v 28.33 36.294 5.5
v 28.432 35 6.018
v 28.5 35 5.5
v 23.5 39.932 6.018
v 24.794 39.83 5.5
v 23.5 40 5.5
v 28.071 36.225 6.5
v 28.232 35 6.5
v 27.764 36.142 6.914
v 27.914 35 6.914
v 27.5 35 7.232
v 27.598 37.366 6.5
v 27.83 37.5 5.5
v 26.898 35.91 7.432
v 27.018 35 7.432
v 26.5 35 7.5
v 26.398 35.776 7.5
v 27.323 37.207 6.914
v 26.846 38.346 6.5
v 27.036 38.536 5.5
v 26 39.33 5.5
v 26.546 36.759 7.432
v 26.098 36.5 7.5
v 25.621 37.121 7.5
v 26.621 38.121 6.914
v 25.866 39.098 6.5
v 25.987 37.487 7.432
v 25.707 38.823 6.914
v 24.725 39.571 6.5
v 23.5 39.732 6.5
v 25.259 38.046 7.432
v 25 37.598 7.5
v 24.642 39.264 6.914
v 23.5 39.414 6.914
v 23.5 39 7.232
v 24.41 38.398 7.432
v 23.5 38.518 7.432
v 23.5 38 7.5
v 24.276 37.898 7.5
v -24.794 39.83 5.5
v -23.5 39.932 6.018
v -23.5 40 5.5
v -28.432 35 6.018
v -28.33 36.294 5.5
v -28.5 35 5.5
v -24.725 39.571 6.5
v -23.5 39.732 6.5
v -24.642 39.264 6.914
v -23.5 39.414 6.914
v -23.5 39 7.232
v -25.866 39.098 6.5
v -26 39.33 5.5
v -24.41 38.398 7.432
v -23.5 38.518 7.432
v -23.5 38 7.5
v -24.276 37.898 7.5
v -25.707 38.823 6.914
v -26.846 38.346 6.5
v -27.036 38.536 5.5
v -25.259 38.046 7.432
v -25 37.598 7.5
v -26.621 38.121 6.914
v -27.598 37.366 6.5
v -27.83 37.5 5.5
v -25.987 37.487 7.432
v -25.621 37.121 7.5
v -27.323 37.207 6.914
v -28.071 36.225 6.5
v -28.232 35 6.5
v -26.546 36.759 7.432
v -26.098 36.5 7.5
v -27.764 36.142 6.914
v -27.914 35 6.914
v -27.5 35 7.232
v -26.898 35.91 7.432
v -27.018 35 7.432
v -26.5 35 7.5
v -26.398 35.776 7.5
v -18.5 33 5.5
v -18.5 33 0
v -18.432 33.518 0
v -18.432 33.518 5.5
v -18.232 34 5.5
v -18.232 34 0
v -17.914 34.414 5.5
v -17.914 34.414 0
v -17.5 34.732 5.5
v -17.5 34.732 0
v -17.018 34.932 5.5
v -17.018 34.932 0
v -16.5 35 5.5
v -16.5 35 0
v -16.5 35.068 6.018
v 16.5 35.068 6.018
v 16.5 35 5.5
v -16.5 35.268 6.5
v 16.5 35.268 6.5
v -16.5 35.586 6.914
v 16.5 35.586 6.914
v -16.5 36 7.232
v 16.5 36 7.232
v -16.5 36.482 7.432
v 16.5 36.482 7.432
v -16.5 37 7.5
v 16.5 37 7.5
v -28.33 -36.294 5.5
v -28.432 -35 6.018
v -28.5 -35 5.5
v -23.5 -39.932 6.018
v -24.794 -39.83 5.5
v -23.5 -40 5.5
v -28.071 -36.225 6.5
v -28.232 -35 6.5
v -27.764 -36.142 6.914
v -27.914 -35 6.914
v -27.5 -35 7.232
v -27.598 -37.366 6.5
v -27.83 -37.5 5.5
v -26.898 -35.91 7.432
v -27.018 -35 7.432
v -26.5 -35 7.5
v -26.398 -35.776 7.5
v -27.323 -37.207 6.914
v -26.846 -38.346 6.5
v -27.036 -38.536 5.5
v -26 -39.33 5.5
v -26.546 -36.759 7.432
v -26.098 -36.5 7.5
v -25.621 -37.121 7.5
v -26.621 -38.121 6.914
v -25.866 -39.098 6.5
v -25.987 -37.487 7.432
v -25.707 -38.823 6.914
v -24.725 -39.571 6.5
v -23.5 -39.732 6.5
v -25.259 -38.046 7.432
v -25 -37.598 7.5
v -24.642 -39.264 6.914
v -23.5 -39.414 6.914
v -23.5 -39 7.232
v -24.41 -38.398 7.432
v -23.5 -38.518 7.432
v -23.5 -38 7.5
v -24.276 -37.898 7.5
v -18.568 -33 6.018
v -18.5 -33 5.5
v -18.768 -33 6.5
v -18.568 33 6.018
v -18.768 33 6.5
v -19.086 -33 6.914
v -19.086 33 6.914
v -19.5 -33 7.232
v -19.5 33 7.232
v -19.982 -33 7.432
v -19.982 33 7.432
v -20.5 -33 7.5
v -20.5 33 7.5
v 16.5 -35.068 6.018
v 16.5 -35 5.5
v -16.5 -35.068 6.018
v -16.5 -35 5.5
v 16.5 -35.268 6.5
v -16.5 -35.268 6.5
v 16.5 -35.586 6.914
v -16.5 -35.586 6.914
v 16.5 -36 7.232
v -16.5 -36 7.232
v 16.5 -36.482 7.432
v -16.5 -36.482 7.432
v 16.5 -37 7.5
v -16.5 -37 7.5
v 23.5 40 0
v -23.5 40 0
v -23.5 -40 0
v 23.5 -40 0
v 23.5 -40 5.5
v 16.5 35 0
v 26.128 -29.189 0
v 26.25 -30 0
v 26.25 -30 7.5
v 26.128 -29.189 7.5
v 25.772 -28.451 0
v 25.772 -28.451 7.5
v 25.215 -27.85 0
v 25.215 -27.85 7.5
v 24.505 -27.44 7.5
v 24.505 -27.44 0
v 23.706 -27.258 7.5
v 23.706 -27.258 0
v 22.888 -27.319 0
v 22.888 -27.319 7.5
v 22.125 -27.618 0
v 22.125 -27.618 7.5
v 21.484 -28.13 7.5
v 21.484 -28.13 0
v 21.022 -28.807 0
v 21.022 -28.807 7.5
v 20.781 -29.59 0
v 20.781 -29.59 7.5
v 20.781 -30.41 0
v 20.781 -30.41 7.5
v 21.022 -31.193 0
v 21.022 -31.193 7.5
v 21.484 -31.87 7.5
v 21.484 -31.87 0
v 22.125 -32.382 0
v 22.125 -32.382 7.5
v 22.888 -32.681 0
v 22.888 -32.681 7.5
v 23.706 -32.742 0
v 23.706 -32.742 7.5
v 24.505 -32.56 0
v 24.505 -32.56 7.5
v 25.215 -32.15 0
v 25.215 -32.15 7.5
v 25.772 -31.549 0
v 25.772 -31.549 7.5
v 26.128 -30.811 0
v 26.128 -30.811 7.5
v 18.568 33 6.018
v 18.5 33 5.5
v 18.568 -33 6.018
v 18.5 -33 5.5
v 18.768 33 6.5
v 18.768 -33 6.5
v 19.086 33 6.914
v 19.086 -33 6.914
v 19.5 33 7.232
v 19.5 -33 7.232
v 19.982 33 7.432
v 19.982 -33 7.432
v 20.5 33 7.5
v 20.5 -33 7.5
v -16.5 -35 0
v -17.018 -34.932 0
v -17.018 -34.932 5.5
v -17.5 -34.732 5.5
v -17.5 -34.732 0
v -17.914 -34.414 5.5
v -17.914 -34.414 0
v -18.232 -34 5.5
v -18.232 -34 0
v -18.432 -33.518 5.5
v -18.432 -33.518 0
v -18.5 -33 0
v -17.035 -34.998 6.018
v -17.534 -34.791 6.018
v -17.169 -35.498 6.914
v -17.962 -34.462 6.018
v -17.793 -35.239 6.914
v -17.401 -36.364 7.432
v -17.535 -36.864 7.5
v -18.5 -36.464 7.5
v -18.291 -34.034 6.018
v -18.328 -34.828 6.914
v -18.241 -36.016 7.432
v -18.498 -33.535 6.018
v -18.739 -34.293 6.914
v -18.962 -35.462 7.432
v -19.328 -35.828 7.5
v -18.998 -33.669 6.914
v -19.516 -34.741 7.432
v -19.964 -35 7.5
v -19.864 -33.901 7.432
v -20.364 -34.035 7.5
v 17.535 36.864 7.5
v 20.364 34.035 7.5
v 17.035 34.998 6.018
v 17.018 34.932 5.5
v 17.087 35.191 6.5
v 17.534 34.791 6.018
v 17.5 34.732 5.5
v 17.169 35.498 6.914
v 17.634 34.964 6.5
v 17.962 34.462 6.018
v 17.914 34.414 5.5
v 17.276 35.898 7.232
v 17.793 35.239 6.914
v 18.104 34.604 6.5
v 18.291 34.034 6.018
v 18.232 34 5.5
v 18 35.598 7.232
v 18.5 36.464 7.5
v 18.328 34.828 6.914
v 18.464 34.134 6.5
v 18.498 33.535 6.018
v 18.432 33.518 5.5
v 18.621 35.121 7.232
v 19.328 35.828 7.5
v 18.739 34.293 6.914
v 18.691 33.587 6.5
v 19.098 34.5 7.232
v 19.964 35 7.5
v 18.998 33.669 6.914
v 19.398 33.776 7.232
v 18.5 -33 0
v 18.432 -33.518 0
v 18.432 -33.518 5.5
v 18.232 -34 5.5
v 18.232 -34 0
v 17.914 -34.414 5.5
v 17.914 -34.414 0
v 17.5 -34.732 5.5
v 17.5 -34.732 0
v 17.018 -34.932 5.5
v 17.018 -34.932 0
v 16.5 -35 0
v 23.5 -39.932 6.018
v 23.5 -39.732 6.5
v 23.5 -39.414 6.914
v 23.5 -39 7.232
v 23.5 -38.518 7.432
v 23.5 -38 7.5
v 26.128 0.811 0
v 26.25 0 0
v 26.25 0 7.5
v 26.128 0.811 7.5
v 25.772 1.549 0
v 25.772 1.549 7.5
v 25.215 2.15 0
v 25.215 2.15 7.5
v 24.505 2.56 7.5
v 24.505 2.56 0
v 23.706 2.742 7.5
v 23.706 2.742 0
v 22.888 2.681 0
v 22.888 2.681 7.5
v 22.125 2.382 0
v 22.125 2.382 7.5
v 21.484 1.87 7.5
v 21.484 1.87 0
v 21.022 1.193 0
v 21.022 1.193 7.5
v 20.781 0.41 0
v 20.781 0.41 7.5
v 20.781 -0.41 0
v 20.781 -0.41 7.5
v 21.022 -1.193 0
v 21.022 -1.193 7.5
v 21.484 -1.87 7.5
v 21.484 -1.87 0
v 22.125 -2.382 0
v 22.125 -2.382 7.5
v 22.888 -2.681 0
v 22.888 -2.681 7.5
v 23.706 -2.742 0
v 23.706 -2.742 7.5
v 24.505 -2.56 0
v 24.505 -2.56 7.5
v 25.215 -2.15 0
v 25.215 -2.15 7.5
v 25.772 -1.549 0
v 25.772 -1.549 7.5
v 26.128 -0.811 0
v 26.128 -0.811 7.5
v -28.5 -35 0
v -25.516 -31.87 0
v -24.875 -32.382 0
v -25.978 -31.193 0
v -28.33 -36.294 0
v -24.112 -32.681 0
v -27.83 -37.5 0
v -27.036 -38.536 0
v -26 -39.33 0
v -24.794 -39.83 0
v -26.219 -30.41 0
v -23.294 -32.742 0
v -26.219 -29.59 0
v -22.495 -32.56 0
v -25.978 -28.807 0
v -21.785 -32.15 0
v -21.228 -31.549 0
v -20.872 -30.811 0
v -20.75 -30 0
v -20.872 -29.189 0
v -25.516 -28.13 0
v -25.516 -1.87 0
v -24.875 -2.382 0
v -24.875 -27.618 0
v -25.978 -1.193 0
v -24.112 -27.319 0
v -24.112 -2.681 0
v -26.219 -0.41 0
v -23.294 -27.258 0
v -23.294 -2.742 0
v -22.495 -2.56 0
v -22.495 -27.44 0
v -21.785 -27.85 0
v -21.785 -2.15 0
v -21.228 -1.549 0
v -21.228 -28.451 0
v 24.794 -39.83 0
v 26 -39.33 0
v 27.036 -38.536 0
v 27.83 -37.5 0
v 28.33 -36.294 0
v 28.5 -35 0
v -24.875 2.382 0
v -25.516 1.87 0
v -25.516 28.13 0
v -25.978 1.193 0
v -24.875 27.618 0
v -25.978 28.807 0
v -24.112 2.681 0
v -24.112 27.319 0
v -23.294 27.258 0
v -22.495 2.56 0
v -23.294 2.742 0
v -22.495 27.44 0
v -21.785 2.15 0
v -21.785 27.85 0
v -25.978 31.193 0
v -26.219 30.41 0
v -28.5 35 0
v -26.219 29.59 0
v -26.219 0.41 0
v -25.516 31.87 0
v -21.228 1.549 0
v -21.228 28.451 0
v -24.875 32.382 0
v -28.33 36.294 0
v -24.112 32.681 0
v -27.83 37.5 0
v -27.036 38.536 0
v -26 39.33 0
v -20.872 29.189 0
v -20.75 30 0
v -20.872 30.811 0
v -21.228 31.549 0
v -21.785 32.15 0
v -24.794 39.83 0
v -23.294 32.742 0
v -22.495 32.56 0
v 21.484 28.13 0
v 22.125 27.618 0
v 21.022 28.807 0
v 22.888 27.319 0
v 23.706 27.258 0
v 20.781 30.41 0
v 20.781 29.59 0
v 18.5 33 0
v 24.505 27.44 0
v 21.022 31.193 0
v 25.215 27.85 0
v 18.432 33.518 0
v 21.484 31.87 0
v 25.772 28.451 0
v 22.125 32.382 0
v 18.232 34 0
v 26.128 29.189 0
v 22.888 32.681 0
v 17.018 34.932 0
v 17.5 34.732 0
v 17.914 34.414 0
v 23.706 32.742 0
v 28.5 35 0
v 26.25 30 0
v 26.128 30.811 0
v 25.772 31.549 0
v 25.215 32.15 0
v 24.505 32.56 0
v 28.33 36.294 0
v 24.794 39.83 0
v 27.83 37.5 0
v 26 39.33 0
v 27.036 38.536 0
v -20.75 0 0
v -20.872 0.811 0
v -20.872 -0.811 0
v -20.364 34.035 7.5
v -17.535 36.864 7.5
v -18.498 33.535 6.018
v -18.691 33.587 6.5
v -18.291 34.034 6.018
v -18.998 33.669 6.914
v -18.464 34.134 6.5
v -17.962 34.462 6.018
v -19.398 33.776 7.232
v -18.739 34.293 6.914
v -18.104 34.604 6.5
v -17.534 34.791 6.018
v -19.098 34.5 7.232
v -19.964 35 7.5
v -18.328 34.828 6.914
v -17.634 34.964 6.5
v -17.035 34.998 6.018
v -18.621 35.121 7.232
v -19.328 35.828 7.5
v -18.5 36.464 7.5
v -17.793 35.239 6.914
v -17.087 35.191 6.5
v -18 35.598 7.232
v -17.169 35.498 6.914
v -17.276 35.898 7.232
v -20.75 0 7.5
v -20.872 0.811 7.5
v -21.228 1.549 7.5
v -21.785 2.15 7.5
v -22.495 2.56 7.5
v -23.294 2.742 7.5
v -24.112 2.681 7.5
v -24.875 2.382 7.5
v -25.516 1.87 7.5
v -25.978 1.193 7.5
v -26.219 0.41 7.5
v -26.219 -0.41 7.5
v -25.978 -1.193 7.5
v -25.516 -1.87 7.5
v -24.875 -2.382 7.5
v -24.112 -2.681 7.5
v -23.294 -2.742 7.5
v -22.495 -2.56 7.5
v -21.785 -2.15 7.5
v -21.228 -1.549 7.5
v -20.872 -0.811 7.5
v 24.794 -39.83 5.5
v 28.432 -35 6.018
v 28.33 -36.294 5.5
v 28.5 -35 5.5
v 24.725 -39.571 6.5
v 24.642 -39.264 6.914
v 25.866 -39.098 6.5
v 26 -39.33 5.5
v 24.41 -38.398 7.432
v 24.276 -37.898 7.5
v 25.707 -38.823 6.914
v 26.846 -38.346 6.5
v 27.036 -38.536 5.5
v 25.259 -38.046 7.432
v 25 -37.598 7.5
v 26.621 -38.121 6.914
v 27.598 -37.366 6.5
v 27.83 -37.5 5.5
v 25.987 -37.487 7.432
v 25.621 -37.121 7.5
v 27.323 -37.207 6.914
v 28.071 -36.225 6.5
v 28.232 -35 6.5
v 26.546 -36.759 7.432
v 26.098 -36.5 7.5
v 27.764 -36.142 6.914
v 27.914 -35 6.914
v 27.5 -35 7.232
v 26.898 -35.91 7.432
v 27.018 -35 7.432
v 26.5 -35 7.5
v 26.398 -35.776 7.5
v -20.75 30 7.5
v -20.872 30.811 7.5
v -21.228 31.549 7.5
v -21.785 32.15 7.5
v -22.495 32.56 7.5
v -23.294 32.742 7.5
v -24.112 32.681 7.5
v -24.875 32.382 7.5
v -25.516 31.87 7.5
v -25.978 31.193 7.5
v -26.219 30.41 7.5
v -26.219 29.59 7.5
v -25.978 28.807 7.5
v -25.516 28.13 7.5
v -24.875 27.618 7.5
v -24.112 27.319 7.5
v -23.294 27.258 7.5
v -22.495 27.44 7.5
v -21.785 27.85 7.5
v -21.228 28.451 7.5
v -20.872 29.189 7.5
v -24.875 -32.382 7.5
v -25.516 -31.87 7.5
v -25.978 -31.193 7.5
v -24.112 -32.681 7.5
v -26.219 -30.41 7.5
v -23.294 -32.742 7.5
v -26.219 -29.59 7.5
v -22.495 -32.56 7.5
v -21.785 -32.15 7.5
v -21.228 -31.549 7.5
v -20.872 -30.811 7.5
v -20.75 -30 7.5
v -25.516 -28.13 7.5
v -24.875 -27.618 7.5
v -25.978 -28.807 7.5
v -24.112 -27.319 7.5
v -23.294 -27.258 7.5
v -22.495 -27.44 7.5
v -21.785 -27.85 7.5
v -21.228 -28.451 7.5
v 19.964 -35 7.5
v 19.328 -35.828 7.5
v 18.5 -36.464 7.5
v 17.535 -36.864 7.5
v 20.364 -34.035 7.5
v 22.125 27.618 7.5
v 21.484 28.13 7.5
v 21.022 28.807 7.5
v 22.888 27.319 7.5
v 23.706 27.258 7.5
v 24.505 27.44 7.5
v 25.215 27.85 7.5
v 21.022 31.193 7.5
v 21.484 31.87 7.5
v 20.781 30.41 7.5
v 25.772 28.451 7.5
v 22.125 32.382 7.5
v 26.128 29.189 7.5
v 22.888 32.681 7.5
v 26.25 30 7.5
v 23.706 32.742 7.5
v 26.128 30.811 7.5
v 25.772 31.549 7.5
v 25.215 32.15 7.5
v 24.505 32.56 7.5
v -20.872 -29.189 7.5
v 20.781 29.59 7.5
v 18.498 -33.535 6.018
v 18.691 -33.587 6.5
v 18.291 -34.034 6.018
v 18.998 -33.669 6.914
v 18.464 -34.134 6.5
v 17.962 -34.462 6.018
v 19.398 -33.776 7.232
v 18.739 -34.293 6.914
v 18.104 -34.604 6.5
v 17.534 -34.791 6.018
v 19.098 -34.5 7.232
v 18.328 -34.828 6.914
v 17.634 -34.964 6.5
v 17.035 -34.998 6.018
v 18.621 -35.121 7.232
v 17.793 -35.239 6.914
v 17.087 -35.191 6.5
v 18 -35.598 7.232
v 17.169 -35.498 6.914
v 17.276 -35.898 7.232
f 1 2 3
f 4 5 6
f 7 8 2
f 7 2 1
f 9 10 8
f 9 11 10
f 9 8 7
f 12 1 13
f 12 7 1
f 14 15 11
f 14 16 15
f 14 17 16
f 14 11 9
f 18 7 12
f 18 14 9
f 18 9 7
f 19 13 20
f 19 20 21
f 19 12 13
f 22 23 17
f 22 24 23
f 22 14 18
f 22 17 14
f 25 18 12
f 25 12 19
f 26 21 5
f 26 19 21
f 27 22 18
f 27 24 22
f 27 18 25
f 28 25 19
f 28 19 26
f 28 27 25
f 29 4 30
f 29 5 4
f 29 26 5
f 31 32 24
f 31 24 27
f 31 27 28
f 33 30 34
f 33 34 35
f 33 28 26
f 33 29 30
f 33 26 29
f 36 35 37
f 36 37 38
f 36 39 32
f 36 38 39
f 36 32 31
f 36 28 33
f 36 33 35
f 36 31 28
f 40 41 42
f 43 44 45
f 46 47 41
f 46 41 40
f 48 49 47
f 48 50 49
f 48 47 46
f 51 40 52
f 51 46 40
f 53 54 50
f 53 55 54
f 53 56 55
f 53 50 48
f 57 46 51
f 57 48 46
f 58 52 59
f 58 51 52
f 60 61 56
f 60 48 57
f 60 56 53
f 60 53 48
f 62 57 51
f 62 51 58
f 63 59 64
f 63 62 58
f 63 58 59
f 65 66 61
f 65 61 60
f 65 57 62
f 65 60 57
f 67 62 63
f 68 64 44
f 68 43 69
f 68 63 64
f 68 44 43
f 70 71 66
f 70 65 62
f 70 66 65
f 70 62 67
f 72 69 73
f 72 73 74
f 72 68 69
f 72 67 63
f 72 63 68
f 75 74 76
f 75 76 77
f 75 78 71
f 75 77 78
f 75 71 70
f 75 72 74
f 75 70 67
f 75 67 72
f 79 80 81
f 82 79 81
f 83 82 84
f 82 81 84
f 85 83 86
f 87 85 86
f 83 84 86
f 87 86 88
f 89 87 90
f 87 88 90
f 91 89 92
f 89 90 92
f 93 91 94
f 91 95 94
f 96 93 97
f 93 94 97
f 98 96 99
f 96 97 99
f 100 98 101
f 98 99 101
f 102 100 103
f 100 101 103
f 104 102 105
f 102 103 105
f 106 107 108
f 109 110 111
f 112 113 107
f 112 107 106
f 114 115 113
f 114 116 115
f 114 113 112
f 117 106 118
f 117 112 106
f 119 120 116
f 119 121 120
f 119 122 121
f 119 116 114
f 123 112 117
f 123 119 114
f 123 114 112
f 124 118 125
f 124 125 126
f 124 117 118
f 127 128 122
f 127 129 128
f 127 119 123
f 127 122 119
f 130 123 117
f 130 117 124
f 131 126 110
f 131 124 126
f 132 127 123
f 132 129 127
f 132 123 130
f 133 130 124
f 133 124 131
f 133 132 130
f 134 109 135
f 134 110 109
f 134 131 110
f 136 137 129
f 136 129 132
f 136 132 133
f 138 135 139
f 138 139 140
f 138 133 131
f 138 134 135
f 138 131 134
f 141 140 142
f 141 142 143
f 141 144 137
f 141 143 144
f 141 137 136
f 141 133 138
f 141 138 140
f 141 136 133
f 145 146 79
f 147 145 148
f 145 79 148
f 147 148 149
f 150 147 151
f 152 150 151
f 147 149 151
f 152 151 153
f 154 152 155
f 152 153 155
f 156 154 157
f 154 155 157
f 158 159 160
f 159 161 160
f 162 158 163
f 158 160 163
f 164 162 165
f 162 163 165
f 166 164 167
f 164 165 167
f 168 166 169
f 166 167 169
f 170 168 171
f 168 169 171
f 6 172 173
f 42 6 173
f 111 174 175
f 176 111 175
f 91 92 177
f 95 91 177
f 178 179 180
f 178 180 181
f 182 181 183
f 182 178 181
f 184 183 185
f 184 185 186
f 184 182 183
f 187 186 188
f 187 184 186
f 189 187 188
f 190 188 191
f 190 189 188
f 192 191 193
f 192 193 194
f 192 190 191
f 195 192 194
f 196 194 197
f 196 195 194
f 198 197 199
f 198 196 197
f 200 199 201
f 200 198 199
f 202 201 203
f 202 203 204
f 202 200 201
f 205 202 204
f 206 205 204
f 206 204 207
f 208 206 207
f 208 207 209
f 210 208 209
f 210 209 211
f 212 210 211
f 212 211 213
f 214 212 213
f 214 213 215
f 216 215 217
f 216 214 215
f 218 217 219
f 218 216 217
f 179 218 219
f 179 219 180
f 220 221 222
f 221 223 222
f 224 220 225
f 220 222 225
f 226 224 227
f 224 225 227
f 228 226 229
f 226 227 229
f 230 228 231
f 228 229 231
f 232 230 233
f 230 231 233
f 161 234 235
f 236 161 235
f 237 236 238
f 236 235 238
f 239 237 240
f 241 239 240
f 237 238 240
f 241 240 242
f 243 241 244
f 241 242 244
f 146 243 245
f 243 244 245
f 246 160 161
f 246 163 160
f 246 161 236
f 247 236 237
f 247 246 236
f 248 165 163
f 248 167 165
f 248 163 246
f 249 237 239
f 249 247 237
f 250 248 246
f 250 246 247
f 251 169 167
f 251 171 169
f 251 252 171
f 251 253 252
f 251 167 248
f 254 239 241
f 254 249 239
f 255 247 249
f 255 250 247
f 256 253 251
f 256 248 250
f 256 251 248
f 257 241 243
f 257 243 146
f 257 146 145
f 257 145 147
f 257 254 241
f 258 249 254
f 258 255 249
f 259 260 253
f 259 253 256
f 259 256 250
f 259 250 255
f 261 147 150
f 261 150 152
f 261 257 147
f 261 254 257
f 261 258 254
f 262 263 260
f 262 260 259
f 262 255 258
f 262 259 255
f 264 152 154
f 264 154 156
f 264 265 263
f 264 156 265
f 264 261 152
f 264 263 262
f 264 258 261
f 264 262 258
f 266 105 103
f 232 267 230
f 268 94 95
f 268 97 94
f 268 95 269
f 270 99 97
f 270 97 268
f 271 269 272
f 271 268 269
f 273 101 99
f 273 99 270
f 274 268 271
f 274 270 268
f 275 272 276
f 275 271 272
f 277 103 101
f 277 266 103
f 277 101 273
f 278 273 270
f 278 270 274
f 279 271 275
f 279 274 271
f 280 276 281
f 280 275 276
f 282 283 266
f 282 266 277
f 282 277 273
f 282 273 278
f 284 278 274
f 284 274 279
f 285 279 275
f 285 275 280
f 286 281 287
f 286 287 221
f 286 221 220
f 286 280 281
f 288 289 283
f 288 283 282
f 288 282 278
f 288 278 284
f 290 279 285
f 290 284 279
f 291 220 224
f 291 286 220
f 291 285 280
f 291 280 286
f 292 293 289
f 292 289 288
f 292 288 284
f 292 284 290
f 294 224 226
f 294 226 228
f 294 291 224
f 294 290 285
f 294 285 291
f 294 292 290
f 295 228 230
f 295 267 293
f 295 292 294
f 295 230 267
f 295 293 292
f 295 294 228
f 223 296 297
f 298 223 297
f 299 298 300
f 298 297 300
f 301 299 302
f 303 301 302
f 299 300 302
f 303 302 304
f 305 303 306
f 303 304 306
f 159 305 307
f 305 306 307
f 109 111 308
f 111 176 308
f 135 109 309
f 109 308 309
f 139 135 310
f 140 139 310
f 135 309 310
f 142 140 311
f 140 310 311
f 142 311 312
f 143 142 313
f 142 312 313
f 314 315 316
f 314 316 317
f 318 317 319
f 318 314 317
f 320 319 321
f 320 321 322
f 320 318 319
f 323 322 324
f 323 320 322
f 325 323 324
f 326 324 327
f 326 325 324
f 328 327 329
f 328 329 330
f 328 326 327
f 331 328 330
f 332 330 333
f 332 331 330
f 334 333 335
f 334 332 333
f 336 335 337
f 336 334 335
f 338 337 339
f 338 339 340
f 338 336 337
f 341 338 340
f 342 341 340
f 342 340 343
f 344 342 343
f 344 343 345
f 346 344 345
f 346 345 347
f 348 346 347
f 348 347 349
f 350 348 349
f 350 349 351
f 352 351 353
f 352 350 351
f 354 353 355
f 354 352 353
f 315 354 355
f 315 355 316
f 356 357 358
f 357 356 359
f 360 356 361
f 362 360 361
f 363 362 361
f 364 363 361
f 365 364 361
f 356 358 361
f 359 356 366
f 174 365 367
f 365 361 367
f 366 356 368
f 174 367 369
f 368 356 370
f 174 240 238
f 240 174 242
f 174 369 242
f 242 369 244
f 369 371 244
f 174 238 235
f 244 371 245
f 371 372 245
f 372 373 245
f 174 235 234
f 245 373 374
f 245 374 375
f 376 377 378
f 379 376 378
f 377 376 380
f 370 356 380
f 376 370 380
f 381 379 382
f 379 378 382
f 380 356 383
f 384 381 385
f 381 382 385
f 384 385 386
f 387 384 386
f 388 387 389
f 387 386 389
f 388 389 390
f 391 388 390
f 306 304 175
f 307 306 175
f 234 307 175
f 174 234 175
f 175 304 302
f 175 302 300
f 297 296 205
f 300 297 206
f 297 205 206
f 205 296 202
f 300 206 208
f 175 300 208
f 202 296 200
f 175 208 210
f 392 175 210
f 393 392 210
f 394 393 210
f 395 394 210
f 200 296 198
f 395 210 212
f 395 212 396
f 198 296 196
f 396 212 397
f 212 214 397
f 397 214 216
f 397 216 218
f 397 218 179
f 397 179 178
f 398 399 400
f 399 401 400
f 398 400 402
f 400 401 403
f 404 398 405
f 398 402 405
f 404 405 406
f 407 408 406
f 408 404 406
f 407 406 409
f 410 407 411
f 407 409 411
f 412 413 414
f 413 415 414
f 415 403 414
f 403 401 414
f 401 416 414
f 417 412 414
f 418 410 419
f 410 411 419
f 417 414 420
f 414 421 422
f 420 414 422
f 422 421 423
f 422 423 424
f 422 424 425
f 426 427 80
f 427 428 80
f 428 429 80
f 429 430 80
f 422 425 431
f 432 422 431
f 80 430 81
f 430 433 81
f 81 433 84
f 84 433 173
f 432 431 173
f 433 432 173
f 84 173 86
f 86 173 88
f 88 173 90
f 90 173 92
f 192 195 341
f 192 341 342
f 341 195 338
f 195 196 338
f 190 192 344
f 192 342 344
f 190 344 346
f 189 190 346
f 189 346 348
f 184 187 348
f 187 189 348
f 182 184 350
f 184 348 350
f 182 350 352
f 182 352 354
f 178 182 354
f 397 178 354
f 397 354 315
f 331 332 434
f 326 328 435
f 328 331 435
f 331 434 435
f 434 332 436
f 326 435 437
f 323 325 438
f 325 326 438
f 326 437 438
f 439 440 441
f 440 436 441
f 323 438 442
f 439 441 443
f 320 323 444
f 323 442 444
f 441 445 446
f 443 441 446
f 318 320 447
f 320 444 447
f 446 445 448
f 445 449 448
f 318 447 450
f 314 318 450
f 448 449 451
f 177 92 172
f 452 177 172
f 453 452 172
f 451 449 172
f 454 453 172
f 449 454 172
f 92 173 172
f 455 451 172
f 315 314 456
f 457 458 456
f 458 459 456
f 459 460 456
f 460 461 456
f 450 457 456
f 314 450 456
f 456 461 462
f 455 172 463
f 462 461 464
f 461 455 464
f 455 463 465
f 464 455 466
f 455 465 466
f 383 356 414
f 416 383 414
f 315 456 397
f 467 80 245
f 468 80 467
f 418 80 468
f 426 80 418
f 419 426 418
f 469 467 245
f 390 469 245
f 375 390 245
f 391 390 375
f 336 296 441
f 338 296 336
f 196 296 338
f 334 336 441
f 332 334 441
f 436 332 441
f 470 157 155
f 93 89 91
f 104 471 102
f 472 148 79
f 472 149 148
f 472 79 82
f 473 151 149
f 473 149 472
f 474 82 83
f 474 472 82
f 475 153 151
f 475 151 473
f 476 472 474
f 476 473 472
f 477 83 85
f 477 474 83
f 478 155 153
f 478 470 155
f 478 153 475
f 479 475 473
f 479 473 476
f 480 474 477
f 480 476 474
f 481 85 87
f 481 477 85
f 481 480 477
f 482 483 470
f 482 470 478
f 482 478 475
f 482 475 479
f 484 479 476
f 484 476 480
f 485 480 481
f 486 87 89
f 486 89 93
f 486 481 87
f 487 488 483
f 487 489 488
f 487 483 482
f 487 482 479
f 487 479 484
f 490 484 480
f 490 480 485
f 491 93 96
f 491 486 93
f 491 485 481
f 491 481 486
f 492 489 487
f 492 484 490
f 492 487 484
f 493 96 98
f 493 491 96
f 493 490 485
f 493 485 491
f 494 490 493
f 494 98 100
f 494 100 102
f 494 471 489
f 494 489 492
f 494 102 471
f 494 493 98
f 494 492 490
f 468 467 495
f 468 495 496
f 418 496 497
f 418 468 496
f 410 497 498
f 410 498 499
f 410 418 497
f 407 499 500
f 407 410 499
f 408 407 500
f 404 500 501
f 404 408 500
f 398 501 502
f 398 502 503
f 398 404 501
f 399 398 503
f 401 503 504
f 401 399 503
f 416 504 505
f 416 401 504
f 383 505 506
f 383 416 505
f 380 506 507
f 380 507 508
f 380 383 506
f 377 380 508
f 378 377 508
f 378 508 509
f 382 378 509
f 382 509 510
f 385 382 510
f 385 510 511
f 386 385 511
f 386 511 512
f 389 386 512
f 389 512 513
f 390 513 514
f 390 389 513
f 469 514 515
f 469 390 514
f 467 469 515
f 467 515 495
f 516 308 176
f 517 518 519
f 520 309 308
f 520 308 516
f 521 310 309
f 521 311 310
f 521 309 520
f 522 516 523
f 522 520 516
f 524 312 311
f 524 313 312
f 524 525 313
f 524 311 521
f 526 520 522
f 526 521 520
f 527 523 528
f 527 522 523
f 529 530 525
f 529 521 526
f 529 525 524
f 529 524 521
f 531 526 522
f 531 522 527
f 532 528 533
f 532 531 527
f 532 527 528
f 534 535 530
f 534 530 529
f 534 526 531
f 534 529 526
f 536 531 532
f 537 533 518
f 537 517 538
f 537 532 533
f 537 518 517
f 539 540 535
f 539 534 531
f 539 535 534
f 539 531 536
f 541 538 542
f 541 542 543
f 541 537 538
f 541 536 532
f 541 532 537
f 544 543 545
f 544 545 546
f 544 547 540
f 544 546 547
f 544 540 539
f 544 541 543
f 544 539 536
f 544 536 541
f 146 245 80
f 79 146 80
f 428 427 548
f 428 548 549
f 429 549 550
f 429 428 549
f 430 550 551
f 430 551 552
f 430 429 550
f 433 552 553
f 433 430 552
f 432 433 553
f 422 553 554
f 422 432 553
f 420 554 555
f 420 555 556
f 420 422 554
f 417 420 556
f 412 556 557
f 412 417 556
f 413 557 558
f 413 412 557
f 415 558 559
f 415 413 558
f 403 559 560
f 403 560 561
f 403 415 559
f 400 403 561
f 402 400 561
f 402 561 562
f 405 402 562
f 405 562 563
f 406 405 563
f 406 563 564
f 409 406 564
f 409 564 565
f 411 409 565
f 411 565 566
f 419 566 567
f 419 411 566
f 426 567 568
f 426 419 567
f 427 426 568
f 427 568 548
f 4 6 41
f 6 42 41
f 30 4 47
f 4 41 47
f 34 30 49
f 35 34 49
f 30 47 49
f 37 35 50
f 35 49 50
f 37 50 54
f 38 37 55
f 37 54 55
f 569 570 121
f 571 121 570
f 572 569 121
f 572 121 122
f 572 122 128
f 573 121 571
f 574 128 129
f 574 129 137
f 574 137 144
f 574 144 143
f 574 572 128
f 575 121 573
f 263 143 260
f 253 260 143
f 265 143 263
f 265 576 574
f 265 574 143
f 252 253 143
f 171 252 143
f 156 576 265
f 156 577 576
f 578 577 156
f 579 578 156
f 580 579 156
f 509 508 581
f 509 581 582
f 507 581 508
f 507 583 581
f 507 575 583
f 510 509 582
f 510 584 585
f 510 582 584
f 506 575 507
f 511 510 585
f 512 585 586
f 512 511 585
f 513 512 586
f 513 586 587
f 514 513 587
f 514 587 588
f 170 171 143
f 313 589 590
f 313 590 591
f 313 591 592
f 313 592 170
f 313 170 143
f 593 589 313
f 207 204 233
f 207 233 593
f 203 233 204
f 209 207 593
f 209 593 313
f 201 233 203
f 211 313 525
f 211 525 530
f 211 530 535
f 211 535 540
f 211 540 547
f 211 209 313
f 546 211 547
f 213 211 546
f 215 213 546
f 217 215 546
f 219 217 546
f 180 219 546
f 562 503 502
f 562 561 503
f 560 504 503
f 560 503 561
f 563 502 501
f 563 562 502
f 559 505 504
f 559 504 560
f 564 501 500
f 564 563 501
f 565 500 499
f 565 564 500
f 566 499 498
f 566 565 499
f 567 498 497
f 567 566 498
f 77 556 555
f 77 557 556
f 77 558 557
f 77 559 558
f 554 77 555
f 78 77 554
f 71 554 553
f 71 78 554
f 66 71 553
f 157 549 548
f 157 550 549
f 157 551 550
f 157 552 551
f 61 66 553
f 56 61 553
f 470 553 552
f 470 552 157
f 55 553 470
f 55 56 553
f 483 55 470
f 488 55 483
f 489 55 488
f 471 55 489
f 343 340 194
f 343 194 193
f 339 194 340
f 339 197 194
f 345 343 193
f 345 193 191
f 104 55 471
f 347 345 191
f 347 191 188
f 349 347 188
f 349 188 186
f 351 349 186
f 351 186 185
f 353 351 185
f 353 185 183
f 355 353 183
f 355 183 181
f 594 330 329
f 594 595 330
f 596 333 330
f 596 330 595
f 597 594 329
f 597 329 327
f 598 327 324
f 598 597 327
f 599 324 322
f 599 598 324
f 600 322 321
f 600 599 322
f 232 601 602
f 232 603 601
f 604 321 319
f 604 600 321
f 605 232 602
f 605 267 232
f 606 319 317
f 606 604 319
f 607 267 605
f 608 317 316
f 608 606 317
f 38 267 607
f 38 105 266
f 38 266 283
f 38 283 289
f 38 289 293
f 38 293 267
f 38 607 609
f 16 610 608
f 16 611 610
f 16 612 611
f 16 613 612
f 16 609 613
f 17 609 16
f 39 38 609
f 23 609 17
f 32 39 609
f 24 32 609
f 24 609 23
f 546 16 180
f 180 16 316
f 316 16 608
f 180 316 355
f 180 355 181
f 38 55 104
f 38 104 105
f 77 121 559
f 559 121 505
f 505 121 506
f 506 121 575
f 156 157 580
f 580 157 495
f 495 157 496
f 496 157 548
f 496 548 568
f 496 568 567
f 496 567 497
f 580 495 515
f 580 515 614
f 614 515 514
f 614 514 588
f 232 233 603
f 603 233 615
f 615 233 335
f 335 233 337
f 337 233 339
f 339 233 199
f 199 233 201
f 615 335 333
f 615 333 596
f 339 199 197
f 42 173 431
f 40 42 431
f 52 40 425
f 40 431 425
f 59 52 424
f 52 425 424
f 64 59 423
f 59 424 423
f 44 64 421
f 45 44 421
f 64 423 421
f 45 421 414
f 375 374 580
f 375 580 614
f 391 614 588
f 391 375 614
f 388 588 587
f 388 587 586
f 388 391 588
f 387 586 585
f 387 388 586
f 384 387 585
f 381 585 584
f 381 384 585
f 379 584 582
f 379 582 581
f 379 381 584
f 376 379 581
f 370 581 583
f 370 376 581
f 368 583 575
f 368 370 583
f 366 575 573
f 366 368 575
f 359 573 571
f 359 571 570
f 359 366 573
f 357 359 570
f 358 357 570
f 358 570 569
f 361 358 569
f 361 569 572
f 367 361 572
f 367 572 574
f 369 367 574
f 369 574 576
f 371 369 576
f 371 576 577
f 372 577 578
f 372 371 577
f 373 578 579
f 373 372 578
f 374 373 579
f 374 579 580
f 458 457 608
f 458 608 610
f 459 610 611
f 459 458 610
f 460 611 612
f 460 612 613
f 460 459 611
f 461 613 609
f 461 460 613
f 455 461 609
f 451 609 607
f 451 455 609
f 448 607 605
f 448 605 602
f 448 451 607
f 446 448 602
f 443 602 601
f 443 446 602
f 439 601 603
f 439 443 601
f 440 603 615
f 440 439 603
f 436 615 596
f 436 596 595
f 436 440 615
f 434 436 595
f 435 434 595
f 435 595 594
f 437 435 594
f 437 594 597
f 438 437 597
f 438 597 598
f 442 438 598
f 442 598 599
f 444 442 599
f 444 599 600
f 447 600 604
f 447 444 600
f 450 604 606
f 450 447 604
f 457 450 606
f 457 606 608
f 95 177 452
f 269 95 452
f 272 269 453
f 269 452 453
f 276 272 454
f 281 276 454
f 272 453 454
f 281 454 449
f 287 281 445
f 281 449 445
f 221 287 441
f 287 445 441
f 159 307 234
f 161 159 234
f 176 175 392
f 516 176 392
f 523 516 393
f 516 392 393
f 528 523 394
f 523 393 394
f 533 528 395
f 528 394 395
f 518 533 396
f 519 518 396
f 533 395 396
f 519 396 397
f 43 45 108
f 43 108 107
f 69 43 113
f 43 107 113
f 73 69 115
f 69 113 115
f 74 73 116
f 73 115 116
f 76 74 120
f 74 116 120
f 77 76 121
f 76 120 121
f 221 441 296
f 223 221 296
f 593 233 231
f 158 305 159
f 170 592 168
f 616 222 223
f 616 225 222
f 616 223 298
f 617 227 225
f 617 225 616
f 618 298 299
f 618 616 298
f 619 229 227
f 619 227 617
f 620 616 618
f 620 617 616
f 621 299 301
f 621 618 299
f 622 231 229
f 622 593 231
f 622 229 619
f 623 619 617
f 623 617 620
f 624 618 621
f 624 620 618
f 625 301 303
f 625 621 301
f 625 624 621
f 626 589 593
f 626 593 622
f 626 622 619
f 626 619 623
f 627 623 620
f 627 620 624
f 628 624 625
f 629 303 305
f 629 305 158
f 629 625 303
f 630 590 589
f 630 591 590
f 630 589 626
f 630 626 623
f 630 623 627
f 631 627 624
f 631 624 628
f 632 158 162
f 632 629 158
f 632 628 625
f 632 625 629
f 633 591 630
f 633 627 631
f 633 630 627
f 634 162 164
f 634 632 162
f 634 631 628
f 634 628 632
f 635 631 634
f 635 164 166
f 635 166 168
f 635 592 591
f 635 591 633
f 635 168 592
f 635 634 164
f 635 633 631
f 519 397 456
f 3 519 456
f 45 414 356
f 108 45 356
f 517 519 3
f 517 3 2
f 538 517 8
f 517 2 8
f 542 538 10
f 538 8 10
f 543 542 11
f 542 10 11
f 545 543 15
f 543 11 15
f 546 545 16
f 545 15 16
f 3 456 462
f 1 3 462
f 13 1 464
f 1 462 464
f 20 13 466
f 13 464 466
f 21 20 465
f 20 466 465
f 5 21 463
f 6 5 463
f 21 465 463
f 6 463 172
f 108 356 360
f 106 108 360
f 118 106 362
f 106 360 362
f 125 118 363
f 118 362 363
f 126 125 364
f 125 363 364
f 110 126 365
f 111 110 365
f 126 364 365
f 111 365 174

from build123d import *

# Parameters (mm, degrees)
F0_R     = 2.75
F1_DEPTH = 7.5
F2_R     = 2


with BuildPart() as f1:
    # F0 (on Top) → F1 (new body)
    with BuildSketch(Plane.XY):
        with BuildLine():
            Line((23.5, 40), (-23.5, 40))
            ThreePointArc((-23.5, 40), (-27.035534, 38.535534), (-28.5, 35))
            Line((-28.5, 35), (-28.5, -35))
            ThreePointArc((-28.5, -35), (-27.035534, -38.535534), (-23.5, -40))
            Line((-23.5, -40), (23.5, -40))
            ThreePointArc((23.5, -40), (27.035534, -38.535534), (28.5, -35))
            Line((28.5, -35), (28.5, 35))
            ThreePointArc((28.5, 35), (27.035534, 38.535534), (23.5, 40))
        make_face()
        with Locations((-23.5, -30)):
            Circle(F0_R, mode=Mode.SUBTRACT)
        with Locations((23.5, -30)):
            Circle(F0_R, mode=Mode.SUBTRACT)
        with Locations((-23.5, 0)):
            Circle(F0_R, mode=Mode.SUBTRACT)
        with Locations((-23.5, 30)):
            Circle(F0_R, mode=Mode.SUBTRACT)
        with BuildLine():
            ThreePointArc((-18.5, 33), (-17.914214, 34.414214), (-16.5, 35))
            Line((-16.5, 35), (16.5, 35))
            ThreePointArc((16.5, 35), (17.914214, 34.414214), (18.5, 33))
            Line((18.5, 33), (18.5, -33))
            ThreePointArc((18.5, -33), (17.914214, -34.414214), (16.5, -35))
            Line((16.5, -35), (-16.5, -35))
            ThreePointArc((-16.5, -35), (-17.914214, -34.414214), (-18.5, -33))
            Line((-18.5, -33), (-18.5, 33))
        make_face(mode=Mode.SUBTRACT)
        with Locations((23.5, 0)):
            Circle(F0_R, mode=Mode.SUBTRACT)
        with Locations((23.5, 30)):
            Circle(F0_R, mode=Mode.SUBTRACT)
    extrude(amount=F1_DEPTH)

    # F2
    f2_edges = [f1.edges().sort_by_distance(p)[0] for p in [
        (-18.5, 0, 7.5),
        (0, -40, 7.5),
    ]]
    fillet(f2_edges, radius=F2_R)


solid = f1.part
